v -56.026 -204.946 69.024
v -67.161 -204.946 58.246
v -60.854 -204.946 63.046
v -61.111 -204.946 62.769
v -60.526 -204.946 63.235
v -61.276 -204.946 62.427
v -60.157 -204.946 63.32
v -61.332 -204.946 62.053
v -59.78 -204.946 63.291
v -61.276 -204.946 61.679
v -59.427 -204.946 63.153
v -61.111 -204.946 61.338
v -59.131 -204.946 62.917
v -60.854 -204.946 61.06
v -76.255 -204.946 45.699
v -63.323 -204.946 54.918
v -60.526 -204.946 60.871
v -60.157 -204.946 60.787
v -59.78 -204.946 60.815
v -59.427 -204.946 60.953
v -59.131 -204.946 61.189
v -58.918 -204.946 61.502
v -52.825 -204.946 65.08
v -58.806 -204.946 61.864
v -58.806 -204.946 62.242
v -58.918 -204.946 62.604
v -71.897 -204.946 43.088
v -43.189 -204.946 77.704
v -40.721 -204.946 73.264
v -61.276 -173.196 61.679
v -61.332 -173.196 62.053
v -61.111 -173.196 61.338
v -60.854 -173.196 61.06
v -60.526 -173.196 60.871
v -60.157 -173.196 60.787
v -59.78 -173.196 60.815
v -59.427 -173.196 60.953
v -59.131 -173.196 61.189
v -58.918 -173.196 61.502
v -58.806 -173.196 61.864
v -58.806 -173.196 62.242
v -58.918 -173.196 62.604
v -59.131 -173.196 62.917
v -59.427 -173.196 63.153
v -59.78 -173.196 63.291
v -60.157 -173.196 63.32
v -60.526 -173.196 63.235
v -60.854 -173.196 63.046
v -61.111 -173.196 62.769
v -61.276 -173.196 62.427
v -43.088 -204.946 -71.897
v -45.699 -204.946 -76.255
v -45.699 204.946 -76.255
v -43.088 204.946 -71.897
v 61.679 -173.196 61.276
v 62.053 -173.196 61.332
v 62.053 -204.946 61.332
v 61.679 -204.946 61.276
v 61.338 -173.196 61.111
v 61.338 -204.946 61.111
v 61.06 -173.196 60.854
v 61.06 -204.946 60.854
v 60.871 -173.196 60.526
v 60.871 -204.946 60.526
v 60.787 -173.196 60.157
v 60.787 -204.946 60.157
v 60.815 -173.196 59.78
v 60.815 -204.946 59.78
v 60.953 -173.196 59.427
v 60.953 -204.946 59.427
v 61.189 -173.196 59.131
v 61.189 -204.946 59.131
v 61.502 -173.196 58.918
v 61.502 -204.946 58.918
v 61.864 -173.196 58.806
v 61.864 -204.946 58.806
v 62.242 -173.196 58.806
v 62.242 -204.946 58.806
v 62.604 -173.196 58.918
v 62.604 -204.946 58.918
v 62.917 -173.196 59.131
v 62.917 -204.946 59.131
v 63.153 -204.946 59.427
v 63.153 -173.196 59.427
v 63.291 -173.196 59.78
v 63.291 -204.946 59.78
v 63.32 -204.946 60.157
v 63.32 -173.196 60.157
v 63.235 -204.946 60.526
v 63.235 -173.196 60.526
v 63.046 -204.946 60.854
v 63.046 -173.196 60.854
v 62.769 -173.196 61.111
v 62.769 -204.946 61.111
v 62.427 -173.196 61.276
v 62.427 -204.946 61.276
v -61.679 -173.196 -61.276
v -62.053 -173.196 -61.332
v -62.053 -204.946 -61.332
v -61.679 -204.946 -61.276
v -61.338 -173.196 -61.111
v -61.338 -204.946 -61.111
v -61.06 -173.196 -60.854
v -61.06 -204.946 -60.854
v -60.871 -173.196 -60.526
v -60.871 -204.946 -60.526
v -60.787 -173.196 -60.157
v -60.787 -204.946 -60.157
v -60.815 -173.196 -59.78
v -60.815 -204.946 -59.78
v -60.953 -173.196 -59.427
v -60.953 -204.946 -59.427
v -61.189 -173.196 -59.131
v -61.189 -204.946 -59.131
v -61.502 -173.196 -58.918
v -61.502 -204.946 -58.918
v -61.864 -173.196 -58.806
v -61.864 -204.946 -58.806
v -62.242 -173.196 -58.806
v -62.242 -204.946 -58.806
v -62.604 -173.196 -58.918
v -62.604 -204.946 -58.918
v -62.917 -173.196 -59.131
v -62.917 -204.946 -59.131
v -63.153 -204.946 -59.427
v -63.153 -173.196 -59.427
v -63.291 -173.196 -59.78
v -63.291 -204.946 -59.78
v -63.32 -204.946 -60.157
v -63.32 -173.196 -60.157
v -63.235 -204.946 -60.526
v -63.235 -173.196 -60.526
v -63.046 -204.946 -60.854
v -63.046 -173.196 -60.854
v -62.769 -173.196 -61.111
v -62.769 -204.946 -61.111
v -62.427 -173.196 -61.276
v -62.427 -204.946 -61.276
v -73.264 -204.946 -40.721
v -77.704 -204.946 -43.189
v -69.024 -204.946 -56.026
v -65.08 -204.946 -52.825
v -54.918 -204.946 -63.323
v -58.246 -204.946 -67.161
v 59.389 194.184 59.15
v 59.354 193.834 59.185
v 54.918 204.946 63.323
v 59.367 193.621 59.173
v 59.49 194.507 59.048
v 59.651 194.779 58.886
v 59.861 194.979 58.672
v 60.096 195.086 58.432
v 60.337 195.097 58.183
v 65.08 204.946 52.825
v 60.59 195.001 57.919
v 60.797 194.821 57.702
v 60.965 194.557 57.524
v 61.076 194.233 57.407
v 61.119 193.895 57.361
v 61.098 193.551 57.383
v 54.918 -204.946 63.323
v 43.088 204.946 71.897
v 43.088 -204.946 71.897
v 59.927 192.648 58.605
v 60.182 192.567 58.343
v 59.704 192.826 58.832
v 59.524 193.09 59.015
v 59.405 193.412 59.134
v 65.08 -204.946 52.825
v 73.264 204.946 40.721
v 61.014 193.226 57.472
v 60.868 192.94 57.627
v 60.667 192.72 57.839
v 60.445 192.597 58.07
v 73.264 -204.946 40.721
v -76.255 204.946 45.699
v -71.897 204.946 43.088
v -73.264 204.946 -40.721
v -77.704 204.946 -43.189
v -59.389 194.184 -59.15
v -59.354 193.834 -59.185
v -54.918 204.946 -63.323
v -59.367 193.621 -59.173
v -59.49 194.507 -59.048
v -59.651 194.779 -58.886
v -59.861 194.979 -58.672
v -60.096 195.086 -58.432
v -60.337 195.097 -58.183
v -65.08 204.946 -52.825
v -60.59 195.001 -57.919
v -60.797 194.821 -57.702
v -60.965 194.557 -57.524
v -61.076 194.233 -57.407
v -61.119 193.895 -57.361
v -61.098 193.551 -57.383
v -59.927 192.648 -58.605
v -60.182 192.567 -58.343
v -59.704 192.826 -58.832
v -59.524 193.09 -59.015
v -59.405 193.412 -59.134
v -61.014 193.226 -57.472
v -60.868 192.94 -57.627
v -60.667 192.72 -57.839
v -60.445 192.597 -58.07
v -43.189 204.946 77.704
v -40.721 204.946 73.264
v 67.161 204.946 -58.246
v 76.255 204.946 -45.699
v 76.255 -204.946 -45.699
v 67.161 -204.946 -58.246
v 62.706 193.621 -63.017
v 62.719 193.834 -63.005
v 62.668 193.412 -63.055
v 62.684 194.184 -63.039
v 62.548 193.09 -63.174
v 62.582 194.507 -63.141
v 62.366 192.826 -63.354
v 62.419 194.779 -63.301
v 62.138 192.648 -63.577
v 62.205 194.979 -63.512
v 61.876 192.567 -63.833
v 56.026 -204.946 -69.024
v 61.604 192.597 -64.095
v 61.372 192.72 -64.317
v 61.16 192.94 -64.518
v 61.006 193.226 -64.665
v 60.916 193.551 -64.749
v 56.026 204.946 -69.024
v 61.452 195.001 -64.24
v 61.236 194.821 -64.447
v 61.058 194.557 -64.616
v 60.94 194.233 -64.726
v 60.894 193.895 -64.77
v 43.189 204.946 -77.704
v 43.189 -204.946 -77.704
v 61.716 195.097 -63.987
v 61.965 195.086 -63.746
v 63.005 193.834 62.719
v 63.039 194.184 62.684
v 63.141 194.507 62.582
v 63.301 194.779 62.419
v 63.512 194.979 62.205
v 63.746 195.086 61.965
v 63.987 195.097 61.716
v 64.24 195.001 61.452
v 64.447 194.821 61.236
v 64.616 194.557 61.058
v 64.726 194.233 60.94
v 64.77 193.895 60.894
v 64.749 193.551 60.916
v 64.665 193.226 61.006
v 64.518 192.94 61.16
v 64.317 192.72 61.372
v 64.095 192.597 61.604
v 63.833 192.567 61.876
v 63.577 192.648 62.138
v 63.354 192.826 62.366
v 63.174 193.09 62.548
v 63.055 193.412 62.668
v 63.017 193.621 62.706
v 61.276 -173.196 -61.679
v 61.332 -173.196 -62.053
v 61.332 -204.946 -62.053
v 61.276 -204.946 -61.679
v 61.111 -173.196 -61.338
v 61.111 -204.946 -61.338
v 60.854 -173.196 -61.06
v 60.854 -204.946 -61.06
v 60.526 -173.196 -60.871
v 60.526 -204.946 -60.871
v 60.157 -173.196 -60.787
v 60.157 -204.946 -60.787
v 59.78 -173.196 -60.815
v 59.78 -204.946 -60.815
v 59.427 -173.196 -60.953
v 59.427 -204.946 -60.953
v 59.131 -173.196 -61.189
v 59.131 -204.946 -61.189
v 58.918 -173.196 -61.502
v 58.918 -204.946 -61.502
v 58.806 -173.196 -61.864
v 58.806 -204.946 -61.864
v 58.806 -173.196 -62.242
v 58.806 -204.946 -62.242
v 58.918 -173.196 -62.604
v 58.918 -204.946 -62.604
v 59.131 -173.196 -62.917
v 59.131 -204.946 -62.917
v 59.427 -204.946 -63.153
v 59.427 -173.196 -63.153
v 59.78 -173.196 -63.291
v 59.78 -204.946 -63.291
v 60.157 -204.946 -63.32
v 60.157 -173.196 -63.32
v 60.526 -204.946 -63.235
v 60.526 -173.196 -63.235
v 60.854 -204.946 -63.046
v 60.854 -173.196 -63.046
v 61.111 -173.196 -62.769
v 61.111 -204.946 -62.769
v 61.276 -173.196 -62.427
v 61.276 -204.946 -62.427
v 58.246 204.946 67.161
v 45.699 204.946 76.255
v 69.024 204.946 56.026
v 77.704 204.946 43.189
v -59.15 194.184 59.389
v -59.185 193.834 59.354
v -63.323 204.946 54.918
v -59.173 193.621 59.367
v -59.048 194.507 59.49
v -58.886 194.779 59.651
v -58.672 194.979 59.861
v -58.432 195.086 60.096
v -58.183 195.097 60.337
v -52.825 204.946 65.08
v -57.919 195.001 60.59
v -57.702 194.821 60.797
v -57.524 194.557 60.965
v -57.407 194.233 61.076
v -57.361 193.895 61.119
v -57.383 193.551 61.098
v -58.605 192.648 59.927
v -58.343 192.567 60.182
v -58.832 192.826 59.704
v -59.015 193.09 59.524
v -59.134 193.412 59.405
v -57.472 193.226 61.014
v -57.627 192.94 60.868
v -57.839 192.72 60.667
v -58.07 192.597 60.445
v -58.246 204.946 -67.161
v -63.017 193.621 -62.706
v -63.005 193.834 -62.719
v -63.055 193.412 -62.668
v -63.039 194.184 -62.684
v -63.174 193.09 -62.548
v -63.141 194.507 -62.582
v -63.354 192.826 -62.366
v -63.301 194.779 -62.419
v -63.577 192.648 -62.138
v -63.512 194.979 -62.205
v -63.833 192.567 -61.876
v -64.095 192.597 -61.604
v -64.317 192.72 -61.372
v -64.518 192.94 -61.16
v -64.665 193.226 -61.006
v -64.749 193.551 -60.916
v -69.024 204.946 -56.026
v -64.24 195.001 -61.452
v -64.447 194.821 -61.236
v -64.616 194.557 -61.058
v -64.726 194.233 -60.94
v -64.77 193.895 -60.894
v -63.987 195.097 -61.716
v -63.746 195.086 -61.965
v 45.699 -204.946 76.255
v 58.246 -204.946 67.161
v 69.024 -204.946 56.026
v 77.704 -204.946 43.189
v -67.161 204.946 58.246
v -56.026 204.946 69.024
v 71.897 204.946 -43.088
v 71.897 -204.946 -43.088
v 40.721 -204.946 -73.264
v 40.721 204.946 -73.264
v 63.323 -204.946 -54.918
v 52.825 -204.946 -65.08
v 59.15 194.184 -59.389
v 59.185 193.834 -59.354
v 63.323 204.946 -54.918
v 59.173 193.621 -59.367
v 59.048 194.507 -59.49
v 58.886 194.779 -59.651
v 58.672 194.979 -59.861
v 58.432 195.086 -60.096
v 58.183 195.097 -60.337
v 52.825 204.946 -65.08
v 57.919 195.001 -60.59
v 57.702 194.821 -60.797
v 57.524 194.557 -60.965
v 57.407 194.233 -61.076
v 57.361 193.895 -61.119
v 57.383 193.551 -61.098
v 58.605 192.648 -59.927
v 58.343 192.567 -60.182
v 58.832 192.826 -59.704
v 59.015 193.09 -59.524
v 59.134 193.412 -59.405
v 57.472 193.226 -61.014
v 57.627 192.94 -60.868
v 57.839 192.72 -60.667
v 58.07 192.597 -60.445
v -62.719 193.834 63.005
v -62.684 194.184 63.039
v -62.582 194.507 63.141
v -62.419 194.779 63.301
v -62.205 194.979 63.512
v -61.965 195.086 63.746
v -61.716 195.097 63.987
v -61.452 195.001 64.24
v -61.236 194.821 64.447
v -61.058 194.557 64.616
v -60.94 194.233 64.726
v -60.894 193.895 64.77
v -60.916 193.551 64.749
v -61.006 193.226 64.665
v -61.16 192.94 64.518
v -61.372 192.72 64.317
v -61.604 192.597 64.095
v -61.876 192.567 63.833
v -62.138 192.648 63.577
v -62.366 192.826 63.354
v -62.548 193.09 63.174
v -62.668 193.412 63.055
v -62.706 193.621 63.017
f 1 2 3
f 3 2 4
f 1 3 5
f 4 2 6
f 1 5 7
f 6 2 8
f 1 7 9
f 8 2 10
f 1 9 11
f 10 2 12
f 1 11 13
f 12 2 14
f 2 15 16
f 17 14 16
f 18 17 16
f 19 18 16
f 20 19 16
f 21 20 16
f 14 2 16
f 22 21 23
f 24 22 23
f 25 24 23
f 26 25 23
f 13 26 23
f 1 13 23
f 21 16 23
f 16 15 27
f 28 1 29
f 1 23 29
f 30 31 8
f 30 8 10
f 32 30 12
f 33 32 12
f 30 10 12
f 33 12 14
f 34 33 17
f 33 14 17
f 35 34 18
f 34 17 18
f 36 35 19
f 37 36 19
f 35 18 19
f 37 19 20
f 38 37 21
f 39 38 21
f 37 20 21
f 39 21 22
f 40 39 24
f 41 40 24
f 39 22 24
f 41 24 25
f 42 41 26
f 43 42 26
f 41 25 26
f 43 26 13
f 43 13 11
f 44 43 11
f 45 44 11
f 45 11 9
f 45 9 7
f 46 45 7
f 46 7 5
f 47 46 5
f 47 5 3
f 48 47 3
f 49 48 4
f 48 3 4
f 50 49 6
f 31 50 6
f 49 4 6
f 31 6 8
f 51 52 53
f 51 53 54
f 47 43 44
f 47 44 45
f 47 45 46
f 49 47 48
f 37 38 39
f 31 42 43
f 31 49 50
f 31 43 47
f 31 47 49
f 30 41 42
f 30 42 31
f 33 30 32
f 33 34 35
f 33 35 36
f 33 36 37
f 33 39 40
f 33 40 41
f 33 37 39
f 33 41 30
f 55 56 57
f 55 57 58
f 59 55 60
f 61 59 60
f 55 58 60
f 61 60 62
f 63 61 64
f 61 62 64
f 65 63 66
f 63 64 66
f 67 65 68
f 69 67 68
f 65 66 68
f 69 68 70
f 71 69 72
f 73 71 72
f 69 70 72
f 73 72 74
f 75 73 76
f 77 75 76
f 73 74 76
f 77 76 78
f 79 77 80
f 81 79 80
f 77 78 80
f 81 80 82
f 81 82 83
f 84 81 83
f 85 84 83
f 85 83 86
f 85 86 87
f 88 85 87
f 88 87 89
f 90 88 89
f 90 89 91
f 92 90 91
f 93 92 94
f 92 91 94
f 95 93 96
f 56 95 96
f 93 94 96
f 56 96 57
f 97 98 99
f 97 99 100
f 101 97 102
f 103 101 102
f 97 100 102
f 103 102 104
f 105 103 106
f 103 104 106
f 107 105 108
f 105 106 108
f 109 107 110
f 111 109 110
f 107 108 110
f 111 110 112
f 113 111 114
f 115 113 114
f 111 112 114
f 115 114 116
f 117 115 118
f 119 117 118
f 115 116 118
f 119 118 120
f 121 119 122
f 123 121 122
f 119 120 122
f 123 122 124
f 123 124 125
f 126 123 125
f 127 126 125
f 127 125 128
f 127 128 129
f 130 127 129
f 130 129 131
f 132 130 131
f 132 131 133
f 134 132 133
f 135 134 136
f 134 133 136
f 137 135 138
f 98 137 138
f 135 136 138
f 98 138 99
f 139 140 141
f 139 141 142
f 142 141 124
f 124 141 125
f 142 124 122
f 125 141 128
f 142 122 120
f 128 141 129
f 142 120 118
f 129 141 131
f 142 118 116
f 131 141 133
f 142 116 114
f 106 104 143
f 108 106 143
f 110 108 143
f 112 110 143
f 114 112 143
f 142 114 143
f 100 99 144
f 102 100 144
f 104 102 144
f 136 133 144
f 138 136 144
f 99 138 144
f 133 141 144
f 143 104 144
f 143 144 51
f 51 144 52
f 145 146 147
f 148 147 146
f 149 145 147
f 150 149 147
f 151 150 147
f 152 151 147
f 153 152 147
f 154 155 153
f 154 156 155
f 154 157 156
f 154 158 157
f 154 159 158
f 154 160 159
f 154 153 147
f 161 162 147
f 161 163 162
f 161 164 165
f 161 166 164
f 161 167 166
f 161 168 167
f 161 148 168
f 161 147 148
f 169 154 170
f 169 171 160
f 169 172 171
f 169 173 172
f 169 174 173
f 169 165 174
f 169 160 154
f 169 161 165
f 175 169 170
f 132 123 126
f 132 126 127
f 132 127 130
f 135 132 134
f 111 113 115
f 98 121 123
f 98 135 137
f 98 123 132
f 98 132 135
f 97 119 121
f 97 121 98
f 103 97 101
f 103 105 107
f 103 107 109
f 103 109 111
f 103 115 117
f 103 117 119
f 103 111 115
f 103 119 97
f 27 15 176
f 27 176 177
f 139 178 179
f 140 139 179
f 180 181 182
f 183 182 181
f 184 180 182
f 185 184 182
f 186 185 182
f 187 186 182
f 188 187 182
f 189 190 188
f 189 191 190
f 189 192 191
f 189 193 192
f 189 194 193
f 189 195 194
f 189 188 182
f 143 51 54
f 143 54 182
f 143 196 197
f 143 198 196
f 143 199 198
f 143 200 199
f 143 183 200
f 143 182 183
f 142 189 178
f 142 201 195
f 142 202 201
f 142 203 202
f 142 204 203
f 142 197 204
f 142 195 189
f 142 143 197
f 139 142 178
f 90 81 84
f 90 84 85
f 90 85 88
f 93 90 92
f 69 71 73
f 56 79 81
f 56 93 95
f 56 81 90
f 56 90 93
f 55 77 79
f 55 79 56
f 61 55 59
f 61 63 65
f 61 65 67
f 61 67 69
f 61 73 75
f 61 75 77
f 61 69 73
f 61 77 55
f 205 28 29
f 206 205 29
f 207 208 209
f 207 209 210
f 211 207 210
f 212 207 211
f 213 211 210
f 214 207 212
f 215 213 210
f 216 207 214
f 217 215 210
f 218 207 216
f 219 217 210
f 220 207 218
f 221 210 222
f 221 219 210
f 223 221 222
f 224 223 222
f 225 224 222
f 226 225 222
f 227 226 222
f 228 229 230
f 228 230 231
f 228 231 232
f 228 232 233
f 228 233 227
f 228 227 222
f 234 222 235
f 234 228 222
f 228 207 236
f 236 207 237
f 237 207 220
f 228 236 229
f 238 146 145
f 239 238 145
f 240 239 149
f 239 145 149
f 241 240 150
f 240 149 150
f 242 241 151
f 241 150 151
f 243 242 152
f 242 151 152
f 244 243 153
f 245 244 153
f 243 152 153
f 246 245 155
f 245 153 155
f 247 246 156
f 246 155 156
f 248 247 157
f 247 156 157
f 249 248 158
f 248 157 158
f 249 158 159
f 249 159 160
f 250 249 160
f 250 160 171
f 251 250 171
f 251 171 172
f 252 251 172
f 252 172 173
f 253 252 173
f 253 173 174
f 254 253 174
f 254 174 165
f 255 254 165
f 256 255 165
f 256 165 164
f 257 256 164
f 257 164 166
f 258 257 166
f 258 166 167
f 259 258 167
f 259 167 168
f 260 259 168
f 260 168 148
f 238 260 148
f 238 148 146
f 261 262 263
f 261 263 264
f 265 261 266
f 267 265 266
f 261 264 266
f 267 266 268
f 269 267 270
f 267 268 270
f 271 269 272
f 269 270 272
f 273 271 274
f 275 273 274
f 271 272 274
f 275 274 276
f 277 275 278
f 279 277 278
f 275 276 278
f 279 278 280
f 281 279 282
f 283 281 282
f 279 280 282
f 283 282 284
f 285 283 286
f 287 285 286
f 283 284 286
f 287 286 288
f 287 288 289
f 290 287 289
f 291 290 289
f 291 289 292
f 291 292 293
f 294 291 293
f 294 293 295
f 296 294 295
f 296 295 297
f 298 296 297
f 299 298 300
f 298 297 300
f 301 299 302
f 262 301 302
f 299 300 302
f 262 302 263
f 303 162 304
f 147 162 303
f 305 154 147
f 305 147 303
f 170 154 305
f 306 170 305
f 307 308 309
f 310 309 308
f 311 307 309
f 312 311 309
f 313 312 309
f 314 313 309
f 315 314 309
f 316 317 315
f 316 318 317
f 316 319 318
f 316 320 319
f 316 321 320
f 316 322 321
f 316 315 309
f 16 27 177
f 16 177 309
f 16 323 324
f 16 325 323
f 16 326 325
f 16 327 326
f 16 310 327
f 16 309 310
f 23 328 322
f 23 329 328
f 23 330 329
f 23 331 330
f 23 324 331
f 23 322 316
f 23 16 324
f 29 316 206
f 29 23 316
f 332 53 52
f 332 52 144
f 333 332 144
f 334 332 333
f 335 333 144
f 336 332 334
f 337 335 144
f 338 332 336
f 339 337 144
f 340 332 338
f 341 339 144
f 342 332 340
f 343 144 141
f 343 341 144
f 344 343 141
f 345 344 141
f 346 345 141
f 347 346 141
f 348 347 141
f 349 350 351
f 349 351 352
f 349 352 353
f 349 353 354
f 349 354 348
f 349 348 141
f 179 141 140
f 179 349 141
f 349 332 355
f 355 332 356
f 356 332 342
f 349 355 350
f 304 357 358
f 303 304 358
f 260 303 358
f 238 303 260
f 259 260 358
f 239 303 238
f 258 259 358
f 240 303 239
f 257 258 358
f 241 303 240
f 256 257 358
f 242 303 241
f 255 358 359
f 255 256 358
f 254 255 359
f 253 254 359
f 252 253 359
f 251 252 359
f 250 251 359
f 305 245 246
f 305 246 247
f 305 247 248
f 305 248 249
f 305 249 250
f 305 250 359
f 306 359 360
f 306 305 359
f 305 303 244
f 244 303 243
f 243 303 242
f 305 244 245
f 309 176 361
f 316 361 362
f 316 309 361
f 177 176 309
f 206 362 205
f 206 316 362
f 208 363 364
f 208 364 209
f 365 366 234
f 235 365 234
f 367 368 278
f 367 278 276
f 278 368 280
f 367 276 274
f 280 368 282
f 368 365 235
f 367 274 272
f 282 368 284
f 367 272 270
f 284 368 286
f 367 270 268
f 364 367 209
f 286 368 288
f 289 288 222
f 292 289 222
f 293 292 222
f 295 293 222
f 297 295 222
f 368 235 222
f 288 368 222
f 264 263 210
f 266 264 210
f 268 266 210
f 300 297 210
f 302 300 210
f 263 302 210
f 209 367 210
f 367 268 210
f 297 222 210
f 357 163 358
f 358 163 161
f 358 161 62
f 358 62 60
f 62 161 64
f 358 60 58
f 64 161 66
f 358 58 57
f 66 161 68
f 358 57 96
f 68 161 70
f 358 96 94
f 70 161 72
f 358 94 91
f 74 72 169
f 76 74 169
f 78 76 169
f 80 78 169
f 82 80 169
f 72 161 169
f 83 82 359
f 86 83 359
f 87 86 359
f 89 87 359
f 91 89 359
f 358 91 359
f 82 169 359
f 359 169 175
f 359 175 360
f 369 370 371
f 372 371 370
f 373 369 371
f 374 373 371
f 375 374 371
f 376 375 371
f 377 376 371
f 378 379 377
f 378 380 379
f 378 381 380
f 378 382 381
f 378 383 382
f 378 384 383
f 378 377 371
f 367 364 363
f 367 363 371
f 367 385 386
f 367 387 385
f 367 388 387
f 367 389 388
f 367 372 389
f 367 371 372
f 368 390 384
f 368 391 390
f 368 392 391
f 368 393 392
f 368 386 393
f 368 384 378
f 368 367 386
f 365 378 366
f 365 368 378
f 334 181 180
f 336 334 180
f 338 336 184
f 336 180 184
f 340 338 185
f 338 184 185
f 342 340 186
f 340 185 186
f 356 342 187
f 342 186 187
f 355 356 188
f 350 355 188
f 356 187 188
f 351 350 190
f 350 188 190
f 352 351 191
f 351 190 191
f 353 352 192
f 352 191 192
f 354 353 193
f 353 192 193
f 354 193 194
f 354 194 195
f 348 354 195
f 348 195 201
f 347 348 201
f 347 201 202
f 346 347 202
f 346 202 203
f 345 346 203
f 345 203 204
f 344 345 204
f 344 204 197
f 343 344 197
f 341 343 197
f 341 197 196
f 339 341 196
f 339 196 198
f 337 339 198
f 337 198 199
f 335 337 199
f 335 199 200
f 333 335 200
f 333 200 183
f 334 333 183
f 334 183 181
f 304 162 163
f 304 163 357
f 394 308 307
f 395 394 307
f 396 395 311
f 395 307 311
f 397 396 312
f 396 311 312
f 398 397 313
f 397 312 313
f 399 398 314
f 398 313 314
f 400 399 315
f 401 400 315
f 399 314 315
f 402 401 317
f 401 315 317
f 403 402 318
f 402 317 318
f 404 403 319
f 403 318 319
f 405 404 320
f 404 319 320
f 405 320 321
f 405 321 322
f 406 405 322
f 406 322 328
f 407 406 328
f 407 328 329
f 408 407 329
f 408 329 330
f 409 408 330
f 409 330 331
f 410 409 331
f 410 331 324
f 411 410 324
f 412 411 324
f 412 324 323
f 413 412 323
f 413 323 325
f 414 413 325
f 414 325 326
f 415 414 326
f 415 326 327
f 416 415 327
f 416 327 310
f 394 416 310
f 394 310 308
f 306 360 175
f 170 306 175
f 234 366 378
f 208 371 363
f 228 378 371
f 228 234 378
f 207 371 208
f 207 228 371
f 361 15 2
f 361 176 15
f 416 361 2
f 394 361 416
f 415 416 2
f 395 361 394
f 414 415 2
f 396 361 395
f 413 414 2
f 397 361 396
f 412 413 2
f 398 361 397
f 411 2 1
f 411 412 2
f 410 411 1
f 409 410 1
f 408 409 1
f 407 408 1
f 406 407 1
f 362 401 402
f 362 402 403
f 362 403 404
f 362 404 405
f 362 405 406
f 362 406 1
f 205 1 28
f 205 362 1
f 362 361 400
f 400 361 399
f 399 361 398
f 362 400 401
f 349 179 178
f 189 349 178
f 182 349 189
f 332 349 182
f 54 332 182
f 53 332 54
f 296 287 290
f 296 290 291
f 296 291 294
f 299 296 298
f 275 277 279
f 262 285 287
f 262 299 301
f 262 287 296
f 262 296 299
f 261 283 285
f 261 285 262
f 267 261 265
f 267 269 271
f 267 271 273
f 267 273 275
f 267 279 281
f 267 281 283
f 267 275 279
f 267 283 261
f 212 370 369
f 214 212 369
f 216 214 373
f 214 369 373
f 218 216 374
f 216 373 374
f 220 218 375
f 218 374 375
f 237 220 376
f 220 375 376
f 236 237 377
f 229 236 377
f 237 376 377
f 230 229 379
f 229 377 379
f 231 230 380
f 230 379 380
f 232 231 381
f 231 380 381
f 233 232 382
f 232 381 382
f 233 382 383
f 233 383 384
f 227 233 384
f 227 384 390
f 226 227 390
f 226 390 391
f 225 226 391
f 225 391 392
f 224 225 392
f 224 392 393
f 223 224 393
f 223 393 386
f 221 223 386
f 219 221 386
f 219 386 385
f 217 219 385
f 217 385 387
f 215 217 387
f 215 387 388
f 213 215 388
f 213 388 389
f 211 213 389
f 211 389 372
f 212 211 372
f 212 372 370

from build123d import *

# Parameters (mm, degrees)
SKETCH2_R               = 88.9
SKETCH2_R_2             = 83.82
BOSS_EXTRUDE1_DEPTH     = 204.94625
CUT_EXTRUDE1_DEPTH      = 205.94625
CUT_EXTRUDE1_DEPTH_BACK = 205.94625
SKETCH5_R               = 1.27
TOP_BOLT_HOLES_DEPTH    = 29.911624556
SKETCH6_R               = 1.27
BOTTOM_BOLT_HOLES_DEPTH = 31.75
BOLT_PATTERN_COUNT      = 4


with BuildPart() as part:
    # Sketch2 → Boss-Extrude1 (new body, symmetric)
    with BuildSketch(Plane(origin=(0, 0, 0), x_dir=(1, 0, 0), z_dir=(0, 1, 0))):
        Circle(SKETCH2_R)
        Circle(SKETCH2_R_2, mode=Mode.SUBTRACT)
    extrude(amount=BOSS_EXTRUDE1_DEPTH, both=True)

    # Sketch3 → Cut-Extrude1 (cut, two sides)
    with BuildSketch(Plane(origin=(0, 0, 0), x_dir=(1, 0, 0), z_dir=(0, 1, 0))) as cut_extrude1_sk:
        Polygon((169.661755759, -94.300371224), (0, 0), (169.661755759, 101.677593364), align=None)
        Polygon((0, 0), (53.900027233, 96.974944394), (-58.116685864, 96.974944394), align=None)
        Polygon((-123.741299607, 68.777140945), (-123.741299607, -74.157652604), (0, 0), align=None)
        Polygon((-65.840936026, -118.45858783), (0, 0), (70.991745134, -118.45858783), align=None)
    extrude(amount=CUT_EXTRUDE1_DEPTH, mode=Mode.SUBTRACT)
    extrude(cut_extrude1_sk.sketch, amount=-CUT_EXTRUDE1_DEPTH_BACK, mode=Mode.SUBTRACT)

    # Sketch5 → Top bolt holes (cut, through all)
    with BuildSketch(Plane(origin=(-56.309218645, 0, 58.175814955), x_dir=(-0.718540152, 0, -0.695485478), z_dir=(0.695485478, 0, -0.718540152))):
        with Locations((-0.02278764, 193.83375)):
            Circle(SKETCH5_R)
    top_bolt_holes = extrude(amount=-TOP_BOLT_HOLES_DEPTH, mode=Mode.SUBTRACT)

    # Sketch6 → Bottom bolt holes (cut)
    with BuildSketch(Plane(origin=(0, -204.94625, 0), x_dir=(-1, 0, 0), z_dir=(0, -1, 0))):
        with Locations((60.062125915, -62.053127484)):
            Circle(SKETCH6_R)
    bottom_bolt_holes = extrude(amount=-BOTTOM_BOLT_HOLES_DEPTH, mode=Mode.SUBTRACT)

    # Bolt pattern: Top bolt holes, Bottom bolt holes ×4 about axis
    bolt_pattern_axis = Axis((0, 0, 0), (0, 1, 0))
    for i in range(1, BOLT_PATTERN_COUNT):
        add(top_bolt_holes.rotate(bolt_pattern_axis, i * 360 / BOLT_PATTERN_COUNT), mode=Mode.SUBTRACT)
        add(bottom_bolt_holes.rotate(bolt_pattern_axis, i * 360 / BOLT_PATTERN_COUNT), mode=Mode.SUBTRACT)


solid = part.part
